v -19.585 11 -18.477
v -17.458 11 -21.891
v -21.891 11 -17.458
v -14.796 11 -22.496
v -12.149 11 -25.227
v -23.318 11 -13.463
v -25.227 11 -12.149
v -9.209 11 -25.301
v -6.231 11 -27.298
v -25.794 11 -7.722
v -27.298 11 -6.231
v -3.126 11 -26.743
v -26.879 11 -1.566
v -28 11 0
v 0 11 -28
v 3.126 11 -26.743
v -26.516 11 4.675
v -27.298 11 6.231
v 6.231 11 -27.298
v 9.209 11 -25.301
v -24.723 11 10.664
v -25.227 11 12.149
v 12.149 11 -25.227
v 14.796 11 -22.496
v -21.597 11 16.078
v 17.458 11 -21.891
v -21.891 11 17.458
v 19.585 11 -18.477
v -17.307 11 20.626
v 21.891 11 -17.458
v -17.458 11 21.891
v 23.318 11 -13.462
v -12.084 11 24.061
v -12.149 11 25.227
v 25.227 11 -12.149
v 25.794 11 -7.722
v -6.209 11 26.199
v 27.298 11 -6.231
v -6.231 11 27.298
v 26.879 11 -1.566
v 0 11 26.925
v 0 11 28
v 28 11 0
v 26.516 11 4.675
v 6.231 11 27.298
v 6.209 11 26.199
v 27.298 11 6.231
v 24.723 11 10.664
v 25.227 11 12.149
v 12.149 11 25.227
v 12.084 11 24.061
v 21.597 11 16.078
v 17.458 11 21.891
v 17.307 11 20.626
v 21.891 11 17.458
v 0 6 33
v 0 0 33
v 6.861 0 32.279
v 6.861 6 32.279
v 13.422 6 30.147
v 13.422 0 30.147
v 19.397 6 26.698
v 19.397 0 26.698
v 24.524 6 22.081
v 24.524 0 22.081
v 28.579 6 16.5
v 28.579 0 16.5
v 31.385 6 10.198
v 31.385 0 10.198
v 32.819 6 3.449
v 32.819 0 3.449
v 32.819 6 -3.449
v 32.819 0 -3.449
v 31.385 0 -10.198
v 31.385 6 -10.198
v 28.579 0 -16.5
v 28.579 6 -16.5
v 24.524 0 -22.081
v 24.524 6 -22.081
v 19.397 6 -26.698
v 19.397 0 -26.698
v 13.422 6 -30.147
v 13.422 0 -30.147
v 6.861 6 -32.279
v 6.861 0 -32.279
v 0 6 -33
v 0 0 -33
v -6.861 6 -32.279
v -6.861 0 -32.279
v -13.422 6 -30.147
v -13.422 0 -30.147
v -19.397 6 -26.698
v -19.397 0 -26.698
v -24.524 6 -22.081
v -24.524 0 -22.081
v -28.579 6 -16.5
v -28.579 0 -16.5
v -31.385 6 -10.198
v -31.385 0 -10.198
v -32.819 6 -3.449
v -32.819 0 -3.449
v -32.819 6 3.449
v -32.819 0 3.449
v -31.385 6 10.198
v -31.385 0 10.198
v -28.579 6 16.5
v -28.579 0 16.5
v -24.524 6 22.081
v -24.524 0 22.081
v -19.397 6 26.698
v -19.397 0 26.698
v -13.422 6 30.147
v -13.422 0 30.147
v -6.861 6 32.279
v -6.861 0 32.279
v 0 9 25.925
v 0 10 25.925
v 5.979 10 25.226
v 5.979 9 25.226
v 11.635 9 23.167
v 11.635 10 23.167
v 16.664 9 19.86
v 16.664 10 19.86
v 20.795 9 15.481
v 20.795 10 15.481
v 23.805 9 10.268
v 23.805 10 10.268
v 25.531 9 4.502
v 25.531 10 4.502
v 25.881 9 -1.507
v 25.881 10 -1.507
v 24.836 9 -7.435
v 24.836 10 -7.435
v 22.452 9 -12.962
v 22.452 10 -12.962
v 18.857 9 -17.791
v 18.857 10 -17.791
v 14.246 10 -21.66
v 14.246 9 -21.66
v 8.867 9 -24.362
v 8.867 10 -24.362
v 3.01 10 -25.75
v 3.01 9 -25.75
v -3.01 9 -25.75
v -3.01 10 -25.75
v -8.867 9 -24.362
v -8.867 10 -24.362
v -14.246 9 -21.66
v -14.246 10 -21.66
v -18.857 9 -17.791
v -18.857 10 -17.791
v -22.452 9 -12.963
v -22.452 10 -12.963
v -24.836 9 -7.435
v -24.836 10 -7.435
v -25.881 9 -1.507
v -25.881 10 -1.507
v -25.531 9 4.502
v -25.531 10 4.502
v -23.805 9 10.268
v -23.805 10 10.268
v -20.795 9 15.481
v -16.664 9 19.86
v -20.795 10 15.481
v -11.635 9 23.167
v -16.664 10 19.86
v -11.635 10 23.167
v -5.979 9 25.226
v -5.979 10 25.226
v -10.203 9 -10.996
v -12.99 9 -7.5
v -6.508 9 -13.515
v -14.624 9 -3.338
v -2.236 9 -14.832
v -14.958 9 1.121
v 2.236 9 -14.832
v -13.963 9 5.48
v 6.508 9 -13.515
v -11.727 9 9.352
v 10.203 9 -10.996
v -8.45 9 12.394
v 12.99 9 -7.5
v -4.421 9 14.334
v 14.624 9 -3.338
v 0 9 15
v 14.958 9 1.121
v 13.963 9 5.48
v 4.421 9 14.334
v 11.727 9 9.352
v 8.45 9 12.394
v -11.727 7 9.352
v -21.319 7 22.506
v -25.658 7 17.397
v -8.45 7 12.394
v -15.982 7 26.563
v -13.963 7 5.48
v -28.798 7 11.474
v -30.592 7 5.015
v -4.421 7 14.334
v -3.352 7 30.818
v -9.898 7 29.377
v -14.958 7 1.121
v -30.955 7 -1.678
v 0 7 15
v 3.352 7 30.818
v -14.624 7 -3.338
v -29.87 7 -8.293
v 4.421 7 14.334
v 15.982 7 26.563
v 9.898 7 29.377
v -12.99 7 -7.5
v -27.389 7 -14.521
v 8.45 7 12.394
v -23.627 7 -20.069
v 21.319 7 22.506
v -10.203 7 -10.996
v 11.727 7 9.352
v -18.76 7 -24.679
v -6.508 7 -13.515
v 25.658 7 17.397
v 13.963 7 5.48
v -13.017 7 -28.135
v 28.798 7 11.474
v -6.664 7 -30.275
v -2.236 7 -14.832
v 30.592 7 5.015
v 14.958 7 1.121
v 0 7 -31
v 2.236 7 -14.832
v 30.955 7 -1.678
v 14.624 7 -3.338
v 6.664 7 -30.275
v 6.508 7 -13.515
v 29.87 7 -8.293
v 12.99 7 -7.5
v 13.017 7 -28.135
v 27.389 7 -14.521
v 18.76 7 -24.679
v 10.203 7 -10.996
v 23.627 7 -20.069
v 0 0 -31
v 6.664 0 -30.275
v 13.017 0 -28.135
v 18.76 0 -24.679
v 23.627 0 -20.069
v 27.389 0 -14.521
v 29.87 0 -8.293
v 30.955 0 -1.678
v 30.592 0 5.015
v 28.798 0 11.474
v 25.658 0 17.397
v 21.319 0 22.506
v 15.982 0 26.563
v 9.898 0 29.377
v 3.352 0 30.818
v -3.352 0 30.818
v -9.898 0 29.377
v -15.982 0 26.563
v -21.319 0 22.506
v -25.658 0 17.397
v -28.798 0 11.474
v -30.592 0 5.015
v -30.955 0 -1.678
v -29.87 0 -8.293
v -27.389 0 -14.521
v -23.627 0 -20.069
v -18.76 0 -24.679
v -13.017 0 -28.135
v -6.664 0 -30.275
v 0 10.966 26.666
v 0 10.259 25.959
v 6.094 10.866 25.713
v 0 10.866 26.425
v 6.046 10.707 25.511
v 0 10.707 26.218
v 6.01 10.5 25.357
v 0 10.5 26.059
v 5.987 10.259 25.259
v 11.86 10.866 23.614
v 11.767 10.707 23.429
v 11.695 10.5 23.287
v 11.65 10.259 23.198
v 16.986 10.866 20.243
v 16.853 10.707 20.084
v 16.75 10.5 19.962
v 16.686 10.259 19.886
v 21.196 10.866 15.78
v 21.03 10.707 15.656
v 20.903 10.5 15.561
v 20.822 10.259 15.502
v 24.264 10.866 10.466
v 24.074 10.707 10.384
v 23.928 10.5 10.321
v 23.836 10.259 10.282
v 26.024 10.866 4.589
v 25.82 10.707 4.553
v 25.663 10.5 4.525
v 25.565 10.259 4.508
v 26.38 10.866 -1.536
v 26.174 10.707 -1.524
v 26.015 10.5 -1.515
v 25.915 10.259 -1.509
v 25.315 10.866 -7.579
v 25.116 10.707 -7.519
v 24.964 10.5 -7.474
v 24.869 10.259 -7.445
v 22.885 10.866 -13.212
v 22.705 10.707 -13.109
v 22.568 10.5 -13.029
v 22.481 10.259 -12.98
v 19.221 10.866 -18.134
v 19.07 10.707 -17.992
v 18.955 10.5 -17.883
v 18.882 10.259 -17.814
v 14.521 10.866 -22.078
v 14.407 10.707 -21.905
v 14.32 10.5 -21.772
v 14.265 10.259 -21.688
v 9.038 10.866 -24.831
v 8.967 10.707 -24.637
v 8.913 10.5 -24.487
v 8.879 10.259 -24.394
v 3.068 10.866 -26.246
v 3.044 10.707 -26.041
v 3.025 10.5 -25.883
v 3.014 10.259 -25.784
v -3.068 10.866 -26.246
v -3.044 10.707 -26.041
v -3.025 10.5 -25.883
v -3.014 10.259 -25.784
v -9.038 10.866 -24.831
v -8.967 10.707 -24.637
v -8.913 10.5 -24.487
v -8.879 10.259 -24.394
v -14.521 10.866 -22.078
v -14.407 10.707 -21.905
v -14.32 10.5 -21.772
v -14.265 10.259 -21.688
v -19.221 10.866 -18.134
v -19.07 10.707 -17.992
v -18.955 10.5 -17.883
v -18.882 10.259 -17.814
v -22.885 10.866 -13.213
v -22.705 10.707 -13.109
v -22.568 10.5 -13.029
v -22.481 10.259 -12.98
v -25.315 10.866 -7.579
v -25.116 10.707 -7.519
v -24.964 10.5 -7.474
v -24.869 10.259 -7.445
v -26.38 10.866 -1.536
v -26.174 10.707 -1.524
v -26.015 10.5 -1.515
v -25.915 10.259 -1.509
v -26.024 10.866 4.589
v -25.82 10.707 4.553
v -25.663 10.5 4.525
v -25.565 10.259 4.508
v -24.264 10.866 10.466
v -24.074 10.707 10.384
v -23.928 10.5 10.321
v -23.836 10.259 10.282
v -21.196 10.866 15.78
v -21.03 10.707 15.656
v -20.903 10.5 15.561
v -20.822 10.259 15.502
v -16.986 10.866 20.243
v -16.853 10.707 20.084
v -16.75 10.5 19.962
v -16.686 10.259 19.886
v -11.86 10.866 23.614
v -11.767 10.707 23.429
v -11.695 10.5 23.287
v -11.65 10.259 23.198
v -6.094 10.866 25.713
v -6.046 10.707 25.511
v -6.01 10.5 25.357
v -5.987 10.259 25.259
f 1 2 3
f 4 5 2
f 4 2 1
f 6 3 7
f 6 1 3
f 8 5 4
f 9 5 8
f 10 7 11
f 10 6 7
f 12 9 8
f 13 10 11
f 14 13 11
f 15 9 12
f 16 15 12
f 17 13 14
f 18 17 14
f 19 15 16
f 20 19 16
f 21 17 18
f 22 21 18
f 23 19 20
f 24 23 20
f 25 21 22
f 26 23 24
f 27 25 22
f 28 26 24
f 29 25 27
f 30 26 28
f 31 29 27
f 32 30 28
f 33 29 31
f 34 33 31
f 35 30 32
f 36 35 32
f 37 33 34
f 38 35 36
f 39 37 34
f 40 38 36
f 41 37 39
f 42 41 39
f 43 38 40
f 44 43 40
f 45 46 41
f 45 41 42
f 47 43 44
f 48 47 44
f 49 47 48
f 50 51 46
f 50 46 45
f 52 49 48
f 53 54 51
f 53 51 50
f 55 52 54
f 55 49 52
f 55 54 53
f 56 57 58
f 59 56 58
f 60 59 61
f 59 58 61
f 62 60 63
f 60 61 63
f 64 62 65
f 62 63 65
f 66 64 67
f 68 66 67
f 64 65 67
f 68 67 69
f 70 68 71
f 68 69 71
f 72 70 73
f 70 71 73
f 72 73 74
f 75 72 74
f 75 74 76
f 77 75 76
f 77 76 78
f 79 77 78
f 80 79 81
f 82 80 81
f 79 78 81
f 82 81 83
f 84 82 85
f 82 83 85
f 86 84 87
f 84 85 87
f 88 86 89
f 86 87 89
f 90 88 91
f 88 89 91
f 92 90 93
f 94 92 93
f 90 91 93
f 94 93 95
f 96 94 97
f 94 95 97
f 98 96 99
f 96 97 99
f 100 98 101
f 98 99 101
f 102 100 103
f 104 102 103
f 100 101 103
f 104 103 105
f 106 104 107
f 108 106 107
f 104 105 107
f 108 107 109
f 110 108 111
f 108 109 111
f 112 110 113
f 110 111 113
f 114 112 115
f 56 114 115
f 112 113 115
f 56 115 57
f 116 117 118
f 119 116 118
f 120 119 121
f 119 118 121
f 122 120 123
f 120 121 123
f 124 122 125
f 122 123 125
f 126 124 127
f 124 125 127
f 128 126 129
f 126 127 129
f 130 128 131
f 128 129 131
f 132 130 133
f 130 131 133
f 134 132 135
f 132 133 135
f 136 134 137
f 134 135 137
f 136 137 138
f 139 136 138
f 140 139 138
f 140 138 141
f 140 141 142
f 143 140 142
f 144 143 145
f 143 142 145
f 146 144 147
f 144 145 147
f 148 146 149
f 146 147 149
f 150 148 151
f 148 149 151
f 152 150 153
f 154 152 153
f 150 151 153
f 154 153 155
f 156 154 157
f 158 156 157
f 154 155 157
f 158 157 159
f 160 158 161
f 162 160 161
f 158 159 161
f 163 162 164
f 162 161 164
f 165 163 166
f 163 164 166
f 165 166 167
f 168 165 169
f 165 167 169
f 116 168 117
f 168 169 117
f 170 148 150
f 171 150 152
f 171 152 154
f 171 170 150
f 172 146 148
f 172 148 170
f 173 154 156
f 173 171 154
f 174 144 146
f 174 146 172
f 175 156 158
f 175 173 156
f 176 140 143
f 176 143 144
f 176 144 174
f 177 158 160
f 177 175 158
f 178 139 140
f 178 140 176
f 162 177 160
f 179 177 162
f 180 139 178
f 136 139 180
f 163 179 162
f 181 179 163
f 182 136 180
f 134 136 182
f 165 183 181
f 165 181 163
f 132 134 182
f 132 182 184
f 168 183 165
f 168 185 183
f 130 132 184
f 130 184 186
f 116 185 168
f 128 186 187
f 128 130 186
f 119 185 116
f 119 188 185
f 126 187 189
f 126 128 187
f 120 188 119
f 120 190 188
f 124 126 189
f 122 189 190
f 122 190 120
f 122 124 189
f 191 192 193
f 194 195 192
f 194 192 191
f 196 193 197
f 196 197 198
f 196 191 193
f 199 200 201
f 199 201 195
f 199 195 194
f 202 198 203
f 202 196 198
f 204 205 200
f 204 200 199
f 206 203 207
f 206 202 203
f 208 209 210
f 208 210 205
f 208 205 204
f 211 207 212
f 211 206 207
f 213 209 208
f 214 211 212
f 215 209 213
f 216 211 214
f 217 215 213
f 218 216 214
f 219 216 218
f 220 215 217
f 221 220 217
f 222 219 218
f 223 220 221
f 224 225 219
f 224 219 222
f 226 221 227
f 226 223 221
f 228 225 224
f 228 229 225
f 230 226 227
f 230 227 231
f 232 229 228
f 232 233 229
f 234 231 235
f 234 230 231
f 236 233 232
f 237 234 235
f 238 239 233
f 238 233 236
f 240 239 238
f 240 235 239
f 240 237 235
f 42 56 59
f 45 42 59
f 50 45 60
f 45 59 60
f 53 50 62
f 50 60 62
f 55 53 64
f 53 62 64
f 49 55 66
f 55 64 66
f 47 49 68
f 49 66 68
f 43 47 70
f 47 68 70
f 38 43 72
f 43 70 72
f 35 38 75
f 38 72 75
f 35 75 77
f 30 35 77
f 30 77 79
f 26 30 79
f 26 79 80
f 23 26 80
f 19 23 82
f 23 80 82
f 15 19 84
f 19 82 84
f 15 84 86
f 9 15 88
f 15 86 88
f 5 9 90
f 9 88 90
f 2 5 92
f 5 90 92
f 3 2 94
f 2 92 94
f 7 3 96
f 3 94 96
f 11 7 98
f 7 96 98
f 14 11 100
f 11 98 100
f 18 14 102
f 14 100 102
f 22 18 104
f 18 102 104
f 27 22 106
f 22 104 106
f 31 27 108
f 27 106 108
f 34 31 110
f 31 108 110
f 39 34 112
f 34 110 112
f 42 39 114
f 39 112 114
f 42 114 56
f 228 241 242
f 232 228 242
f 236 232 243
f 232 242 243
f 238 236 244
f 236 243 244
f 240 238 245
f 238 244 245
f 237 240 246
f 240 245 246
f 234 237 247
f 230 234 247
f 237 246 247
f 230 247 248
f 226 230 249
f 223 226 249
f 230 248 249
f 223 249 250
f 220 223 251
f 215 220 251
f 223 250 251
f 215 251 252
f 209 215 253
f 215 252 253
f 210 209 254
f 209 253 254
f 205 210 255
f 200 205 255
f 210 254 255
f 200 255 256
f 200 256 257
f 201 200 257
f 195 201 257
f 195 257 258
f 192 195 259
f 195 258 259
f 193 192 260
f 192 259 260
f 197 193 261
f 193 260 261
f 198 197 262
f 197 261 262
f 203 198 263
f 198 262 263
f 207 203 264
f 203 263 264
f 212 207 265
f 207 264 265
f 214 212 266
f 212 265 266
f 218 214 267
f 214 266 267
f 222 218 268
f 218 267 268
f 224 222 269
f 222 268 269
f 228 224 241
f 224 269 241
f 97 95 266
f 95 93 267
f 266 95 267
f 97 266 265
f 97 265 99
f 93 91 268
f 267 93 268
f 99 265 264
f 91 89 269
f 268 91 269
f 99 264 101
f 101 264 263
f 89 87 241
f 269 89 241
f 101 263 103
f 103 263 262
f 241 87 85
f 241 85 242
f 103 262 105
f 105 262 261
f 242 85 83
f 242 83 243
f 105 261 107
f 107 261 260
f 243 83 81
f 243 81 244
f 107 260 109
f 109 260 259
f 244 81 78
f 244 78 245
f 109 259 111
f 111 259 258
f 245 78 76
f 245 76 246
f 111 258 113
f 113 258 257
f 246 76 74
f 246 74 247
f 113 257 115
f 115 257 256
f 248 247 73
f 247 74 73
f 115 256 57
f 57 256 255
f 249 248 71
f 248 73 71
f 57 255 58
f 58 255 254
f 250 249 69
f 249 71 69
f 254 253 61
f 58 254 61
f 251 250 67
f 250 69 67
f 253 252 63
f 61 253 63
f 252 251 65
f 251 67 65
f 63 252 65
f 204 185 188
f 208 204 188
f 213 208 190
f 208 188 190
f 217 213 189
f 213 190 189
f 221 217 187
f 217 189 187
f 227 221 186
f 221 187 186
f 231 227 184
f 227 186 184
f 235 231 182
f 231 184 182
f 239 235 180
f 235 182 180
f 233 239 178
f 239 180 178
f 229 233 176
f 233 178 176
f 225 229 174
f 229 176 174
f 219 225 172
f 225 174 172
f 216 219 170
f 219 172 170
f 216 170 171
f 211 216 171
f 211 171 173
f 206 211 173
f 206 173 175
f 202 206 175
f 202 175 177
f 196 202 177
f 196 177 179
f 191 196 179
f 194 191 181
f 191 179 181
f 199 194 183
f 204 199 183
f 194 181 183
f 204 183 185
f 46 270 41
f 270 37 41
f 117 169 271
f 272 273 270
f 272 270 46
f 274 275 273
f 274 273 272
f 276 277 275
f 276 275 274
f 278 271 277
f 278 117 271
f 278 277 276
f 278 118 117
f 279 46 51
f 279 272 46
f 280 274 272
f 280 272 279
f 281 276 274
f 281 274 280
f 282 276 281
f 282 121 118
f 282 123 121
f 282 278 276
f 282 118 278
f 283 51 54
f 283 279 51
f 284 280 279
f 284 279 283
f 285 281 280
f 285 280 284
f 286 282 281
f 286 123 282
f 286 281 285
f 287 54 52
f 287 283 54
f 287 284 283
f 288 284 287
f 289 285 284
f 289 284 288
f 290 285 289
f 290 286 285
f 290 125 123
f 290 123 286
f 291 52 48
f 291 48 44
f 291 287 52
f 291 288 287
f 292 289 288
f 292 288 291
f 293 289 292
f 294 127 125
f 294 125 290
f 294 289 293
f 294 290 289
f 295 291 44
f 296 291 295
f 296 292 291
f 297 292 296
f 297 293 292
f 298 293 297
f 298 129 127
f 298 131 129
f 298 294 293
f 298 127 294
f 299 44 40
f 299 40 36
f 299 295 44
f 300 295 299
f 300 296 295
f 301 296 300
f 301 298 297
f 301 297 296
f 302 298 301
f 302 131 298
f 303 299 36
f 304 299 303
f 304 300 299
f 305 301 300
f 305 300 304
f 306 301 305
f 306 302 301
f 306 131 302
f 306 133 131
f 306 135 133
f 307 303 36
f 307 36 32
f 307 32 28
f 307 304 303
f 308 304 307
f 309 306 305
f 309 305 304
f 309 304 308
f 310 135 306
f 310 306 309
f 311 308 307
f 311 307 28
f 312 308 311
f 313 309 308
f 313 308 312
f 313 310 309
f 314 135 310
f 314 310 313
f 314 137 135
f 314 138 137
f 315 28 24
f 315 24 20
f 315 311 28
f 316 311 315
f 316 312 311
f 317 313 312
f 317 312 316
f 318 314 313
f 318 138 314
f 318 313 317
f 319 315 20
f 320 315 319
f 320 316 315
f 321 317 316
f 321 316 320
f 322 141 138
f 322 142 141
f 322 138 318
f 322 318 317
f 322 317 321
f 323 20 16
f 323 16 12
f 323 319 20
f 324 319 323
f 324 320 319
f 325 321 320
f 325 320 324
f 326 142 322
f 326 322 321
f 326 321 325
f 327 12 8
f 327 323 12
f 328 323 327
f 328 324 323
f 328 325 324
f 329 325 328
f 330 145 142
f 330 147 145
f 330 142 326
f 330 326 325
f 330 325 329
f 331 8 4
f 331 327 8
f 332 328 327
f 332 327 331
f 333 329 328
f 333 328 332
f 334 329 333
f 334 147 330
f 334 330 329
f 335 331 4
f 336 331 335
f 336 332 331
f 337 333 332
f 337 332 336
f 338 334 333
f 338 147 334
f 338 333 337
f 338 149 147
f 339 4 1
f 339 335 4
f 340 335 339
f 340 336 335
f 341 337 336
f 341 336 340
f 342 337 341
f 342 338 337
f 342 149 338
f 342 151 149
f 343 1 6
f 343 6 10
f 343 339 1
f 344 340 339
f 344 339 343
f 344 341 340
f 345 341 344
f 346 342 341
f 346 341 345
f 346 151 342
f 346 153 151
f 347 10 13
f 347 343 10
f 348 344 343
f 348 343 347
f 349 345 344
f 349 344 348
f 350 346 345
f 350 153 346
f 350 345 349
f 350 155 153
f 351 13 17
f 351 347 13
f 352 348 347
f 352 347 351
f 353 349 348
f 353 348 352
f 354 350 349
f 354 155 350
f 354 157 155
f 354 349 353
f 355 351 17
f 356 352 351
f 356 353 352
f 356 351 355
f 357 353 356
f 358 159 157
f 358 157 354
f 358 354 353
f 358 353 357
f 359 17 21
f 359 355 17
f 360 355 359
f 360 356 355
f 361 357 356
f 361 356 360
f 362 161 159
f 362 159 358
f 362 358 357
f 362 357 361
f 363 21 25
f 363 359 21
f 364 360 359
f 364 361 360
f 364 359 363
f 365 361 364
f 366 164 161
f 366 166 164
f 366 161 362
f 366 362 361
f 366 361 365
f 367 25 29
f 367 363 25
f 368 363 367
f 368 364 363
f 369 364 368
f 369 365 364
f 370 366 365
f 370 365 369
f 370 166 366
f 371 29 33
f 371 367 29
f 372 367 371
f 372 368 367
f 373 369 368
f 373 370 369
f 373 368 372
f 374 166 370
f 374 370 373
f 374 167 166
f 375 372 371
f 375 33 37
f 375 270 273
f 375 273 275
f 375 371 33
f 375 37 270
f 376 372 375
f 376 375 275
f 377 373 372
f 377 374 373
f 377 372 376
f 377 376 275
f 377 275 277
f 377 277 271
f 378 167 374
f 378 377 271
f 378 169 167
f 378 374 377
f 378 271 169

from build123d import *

# Parameters (mm, degrees)
IZIM1_R                     = 33
Y_KSEKLIK_EKSTR_ZYON1_DEPTH = 11
IZIM3_R                     = 31
KES_EKSTR_ZYON1_DEPTH       = 7
IZIM4_R                     = 25.925
KES_EKSTR_ZYON2_DEPTH       = 2
RADYUS2_R                   = 1
PAH1_SIZE                   = 5
IZIM5_R                     = 15
KES_EKSTR_ZYON3_DEPTH       = 2


with BuildPart() as part:
    # Çizim1 → Yükseklik-Ekstrüzyon1 (new body)
    with BuildSketch(Plane(origin=(0, 0, 0), x_dir=(1, 0, 0), z_dir=(0, 1, 0))):
        with Locations(Location((0, 0, 0), (0, 0, 270))):
            Circle(IZIM1_R)
    extrude(amount=Y_KSEKLIK_EKSTR_ZYON1_DEPTH)

    # Çizim3 → Kes-Ekstrüzyon1 (cut)
    with BuildSketch(Plane.XZ):
        with Locations(Location((0, 0, 0), (0, 0, 270))):
            Circle(IZIM3_R)
    extrude(amount=-KES_EKSTR_ZYON1_DEPTH, mode=Mode.SUBTRACT)

    # Çizim4 → Kes-Ekstrüzyon2 (cut)
    with BuildSketch(Plane(origin=(0, 11, 0), x_dir=(1, 0, 0), z_dir=(0, 1, 0))):
        with Locations(Location((0, 0, 0), (0, 0, 270))):
            Circle(IZIM4_R)
    extrude(amount=-KES_EKSTR_ZYON2_DEPTH, mode=Mode.SUBTRACT)

    # Radyus2
    radyus2_edges = [part.edges().sort_by_distance(p)[0] for p in [
        (0, 11, -25.925),
    ]]
    fillet(radyus2_edges, radius=RADYUS2_R)

    # Pah1
    pah1_edges = [part.edges().sort_by_distance(p)[0] for p in [
        (0, 11, -33),
    ]]
    chamfer(pah1_edges, length=PAH1_SIZE)

    # Çizim5 → Kes-Ekstrüzyon3 (cut)
    with BuildSketch(Plane(origin=(0, 9, 0), x_dir=(1, 0, 0), z_dir=(0, 1, 0))):
        with Locations(Location((0, 0, 0), (0, 0, 270))):
            Circle(IZIM5_R)
    extrude(amount=-KES_EKSTR_ZYON3_DEPTH, mode=Mode.SUBTRACT)


solid = part.part
